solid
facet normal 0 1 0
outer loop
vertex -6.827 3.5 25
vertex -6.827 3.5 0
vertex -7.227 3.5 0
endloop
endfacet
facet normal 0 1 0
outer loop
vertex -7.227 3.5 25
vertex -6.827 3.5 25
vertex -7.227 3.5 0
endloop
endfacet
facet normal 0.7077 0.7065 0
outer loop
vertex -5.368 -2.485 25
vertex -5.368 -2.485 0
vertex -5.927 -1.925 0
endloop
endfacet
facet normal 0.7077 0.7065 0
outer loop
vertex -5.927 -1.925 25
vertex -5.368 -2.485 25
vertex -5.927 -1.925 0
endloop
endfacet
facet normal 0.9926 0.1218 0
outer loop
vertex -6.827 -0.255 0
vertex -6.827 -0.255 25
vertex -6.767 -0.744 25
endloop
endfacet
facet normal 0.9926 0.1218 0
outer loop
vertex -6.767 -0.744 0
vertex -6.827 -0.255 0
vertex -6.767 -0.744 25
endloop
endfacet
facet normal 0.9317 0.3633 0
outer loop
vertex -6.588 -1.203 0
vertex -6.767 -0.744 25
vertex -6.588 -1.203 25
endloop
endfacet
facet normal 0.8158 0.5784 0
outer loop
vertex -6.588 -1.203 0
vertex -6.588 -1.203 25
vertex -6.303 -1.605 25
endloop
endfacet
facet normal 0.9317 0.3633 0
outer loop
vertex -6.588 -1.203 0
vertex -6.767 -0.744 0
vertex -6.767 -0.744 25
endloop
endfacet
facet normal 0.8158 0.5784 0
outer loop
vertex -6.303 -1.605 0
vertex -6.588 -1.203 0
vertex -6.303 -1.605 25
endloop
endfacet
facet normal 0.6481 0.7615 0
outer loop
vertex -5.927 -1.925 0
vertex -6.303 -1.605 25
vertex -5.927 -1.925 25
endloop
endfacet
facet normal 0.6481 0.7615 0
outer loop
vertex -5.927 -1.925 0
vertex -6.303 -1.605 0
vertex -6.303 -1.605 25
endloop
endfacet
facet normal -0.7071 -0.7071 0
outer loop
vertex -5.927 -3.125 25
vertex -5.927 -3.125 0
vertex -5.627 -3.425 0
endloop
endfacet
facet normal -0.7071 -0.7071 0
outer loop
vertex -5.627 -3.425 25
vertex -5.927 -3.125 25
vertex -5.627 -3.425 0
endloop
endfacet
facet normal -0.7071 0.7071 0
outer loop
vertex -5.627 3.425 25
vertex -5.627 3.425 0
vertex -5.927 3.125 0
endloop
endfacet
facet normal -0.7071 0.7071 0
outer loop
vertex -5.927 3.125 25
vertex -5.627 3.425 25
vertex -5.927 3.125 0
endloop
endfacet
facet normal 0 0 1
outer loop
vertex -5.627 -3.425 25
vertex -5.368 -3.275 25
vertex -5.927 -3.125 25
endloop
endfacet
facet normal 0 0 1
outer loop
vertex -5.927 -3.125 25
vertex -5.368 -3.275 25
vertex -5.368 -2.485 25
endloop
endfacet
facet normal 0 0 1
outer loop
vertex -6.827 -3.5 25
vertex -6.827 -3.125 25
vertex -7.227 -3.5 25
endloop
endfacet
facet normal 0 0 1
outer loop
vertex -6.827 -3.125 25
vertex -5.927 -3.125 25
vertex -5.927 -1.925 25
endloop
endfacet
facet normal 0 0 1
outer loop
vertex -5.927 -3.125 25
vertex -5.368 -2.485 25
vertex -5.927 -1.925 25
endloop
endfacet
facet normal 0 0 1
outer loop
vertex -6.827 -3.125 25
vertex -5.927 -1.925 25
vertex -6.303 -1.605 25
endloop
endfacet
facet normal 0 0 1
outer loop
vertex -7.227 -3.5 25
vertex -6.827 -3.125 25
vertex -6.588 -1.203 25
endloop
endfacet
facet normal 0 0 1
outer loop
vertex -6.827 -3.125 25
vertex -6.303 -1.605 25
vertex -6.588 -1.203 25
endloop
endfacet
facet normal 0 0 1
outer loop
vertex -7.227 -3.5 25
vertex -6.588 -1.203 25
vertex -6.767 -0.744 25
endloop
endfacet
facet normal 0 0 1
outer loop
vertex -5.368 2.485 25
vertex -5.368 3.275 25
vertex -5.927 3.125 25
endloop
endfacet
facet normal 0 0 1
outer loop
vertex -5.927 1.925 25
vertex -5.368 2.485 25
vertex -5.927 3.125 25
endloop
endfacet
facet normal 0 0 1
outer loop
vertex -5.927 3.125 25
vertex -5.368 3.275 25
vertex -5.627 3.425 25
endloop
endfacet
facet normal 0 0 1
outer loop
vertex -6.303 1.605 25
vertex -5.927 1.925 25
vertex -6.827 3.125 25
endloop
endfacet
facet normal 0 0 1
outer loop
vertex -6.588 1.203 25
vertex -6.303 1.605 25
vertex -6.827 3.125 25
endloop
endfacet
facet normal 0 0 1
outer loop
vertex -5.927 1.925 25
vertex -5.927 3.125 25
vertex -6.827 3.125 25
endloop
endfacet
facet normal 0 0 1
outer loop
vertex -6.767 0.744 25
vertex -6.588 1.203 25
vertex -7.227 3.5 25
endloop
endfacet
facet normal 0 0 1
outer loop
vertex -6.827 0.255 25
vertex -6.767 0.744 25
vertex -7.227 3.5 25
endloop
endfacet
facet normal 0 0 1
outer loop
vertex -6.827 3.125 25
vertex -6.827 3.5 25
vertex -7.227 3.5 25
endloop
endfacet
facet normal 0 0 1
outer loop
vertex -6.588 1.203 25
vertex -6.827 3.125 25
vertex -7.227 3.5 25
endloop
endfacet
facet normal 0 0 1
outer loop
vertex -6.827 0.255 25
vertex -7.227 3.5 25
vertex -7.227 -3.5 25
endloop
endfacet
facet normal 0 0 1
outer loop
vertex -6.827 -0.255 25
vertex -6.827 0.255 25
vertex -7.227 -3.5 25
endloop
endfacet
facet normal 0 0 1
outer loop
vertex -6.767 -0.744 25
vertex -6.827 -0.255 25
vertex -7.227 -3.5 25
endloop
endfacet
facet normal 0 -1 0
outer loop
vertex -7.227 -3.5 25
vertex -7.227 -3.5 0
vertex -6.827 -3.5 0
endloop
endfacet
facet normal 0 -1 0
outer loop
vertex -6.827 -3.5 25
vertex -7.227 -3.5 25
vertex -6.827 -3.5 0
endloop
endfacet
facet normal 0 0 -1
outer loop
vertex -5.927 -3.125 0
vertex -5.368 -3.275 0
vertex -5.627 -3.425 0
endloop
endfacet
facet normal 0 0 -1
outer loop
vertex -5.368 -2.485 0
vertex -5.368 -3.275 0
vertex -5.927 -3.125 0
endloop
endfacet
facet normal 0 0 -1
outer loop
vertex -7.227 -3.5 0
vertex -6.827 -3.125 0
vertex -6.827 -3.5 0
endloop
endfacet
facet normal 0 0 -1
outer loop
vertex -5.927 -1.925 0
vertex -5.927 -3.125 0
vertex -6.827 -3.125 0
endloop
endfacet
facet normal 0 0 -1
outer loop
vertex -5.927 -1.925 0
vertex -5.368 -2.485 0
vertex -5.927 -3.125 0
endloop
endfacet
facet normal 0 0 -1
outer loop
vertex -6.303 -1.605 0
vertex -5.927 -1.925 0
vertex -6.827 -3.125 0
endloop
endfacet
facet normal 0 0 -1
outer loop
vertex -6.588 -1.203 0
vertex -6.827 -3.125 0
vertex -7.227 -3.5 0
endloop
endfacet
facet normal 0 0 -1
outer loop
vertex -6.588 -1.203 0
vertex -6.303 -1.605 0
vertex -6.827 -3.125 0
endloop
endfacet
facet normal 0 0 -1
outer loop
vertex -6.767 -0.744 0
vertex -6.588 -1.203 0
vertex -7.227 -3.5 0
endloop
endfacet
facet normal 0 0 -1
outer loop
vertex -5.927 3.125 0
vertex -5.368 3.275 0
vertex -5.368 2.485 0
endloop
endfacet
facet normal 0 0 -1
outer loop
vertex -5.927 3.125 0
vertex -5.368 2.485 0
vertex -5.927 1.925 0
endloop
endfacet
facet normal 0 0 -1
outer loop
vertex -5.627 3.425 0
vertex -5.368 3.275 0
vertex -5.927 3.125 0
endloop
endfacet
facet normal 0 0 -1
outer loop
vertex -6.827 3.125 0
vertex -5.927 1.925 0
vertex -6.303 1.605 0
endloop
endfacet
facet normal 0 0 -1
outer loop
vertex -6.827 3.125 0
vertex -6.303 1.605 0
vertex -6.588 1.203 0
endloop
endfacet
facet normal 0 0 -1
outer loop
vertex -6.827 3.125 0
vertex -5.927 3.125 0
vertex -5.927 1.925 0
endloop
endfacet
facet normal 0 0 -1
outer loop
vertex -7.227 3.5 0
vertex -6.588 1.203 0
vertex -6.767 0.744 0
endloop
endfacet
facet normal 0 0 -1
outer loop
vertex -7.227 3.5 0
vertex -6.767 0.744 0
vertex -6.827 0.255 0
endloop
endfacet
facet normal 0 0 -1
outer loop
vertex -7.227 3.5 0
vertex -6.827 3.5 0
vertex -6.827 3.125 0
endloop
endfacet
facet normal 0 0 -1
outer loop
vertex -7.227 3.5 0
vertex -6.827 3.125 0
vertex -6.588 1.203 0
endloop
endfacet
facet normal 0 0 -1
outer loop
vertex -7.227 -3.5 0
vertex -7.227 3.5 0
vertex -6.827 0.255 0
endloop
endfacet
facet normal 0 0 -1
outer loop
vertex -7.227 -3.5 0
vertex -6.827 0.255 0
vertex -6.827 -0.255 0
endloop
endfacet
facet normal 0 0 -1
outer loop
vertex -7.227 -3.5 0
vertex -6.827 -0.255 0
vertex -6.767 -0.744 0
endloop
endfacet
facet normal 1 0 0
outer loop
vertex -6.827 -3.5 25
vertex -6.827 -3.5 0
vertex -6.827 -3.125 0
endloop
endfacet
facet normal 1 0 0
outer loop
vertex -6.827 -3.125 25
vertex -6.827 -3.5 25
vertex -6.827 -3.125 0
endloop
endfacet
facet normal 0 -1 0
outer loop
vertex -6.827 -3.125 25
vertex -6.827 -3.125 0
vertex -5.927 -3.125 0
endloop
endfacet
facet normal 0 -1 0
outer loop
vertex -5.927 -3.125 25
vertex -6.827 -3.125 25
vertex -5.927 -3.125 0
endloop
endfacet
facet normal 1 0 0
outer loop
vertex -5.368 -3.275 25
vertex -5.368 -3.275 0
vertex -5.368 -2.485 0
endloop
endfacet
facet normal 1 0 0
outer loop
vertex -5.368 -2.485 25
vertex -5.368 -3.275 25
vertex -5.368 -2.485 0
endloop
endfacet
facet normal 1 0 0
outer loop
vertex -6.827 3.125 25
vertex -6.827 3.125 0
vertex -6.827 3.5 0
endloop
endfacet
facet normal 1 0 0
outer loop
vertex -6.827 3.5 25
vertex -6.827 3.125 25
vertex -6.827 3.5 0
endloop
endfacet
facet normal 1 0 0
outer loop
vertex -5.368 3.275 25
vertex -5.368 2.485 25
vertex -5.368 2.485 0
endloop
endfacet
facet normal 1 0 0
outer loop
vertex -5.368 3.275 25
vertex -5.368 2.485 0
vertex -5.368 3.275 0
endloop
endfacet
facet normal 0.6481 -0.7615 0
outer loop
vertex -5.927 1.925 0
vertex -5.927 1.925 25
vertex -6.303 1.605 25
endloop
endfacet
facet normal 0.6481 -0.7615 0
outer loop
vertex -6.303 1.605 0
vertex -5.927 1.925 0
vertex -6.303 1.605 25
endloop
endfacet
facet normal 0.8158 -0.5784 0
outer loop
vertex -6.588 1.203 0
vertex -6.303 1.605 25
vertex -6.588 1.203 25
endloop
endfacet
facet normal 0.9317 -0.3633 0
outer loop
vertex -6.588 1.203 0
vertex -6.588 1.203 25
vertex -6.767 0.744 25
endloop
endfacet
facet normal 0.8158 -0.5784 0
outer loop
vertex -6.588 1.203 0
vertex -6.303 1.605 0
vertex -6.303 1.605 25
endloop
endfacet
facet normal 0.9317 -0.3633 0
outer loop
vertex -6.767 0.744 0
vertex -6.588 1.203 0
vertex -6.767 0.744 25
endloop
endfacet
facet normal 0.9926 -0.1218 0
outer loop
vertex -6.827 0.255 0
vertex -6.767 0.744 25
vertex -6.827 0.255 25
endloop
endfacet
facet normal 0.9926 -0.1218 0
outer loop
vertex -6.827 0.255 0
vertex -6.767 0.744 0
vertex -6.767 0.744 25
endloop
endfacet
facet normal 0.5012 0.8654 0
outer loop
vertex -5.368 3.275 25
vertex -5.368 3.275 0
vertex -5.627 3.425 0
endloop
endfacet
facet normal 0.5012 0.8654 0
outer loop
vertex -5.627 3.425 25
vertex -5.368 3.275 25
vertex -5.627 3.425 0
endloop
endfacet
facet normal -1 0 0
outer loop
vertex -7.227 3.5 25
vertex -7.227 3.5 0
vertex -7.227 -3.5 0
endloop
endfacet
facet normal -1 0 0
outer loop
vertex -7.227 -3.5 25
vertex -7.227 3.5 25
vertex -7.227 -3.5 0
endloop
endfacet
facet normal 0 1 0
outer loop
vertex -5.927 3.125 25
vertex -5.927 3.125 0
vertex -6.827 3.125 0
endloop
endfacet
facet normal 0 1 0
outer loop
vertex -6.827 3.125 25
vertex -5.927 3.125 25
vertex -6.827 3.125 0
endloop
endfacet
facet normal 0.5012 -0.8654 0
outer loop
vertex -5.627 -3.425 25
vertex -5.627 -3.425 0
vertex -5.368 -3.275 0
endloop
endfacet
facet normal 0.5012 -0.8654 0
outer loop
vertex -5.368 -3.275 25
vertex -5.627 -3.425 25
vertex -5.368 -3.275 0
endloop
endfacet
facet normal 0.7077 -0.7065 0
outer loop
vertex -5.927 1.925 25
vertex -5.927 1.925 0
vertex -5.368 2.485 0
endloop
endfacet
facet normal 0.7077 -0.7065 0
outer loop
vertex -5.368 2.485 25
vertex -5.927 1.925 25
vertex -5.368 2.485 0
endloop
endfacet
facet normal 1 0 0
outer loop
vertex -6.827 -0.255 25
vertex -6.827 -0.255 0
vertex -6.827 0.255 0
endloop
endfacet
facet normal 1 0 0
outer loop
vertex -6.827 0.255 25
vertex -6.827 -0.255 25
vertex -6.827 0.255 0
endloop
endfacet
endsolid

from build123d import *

# Parameters (mm, degrees)
F1_DEPTH    = 25
F2_T1_DEPTH = 25


# Not quite as in the source:
# - a fillet or chamfer that OpenCascade refuses, or shapes differently, is made with other operations: its cross-section is extruded or revolved along the edge and cut away or added


with BuildPart() as f1:
    # F0 (on Top) → F1 (new body)
    with BuildSketch(Plane.XY):
        Polygon((-6.8274033331, 3.5), (-7.2274033331, 3.5), (-7.2274033331, 0), (-7.2274033331, -3.5), (-6.8274033331, -3.5), (-6.8274033331, -3.125), (-5.9274033331, -3.125), (-5.6274033331, -3.425), (-5.3675957119, -3.275), (-5.3675957119, -2.4848076211), (-5.9274033331, -1.925), (-6.8274033331, -1.925), (-6.8274033331, -0.6), (-6.8274033331, 0.6), (-6.8274033331, 1.925), (-5.9274033331, 1.925), (-5.3675957119, 2.4848076211), (-5.3675957119, 3.275), (-5.6274033331, 3.425), (-5.9274033331, 3.125), (-6.8274033331, 3.125), align=None)
    extrude(amount=F1_DEPTH)

    # F2: fillet of radius 2 on 2 edges, made by hand

    # F2_s2 → F2_t1 (join)
    with BuildSketch(Plane.XY):
        with BuildLine():
            ThreePointArc((-5.9274033331, 1.925), (-6.5880850192, 1.2033539892), (-6.8274033331, 0.2546706911))
            Line((-6.8274033331, 0.2546706911), (-6.8274033331, 1.925))
            Line((-6.8274033331, 1.925), (-5.9274033331, 1.925))
        make_face()
        with BuildLine():
            ThreePointArc((-6.8274033331, -0.2546706911), (-6.5880850192, -1.2033539892), (-5.9274033331, -1.925))
            Line((-5.9274033331, -1.925), (-6.8274033331, -1.925))
            Line((-6.8274033331, -1.925), (-6.8274033331, -0.2546706911))
        make_face()
    extrude(amount=F2_T1_DEPTH)


solid = f1.part
